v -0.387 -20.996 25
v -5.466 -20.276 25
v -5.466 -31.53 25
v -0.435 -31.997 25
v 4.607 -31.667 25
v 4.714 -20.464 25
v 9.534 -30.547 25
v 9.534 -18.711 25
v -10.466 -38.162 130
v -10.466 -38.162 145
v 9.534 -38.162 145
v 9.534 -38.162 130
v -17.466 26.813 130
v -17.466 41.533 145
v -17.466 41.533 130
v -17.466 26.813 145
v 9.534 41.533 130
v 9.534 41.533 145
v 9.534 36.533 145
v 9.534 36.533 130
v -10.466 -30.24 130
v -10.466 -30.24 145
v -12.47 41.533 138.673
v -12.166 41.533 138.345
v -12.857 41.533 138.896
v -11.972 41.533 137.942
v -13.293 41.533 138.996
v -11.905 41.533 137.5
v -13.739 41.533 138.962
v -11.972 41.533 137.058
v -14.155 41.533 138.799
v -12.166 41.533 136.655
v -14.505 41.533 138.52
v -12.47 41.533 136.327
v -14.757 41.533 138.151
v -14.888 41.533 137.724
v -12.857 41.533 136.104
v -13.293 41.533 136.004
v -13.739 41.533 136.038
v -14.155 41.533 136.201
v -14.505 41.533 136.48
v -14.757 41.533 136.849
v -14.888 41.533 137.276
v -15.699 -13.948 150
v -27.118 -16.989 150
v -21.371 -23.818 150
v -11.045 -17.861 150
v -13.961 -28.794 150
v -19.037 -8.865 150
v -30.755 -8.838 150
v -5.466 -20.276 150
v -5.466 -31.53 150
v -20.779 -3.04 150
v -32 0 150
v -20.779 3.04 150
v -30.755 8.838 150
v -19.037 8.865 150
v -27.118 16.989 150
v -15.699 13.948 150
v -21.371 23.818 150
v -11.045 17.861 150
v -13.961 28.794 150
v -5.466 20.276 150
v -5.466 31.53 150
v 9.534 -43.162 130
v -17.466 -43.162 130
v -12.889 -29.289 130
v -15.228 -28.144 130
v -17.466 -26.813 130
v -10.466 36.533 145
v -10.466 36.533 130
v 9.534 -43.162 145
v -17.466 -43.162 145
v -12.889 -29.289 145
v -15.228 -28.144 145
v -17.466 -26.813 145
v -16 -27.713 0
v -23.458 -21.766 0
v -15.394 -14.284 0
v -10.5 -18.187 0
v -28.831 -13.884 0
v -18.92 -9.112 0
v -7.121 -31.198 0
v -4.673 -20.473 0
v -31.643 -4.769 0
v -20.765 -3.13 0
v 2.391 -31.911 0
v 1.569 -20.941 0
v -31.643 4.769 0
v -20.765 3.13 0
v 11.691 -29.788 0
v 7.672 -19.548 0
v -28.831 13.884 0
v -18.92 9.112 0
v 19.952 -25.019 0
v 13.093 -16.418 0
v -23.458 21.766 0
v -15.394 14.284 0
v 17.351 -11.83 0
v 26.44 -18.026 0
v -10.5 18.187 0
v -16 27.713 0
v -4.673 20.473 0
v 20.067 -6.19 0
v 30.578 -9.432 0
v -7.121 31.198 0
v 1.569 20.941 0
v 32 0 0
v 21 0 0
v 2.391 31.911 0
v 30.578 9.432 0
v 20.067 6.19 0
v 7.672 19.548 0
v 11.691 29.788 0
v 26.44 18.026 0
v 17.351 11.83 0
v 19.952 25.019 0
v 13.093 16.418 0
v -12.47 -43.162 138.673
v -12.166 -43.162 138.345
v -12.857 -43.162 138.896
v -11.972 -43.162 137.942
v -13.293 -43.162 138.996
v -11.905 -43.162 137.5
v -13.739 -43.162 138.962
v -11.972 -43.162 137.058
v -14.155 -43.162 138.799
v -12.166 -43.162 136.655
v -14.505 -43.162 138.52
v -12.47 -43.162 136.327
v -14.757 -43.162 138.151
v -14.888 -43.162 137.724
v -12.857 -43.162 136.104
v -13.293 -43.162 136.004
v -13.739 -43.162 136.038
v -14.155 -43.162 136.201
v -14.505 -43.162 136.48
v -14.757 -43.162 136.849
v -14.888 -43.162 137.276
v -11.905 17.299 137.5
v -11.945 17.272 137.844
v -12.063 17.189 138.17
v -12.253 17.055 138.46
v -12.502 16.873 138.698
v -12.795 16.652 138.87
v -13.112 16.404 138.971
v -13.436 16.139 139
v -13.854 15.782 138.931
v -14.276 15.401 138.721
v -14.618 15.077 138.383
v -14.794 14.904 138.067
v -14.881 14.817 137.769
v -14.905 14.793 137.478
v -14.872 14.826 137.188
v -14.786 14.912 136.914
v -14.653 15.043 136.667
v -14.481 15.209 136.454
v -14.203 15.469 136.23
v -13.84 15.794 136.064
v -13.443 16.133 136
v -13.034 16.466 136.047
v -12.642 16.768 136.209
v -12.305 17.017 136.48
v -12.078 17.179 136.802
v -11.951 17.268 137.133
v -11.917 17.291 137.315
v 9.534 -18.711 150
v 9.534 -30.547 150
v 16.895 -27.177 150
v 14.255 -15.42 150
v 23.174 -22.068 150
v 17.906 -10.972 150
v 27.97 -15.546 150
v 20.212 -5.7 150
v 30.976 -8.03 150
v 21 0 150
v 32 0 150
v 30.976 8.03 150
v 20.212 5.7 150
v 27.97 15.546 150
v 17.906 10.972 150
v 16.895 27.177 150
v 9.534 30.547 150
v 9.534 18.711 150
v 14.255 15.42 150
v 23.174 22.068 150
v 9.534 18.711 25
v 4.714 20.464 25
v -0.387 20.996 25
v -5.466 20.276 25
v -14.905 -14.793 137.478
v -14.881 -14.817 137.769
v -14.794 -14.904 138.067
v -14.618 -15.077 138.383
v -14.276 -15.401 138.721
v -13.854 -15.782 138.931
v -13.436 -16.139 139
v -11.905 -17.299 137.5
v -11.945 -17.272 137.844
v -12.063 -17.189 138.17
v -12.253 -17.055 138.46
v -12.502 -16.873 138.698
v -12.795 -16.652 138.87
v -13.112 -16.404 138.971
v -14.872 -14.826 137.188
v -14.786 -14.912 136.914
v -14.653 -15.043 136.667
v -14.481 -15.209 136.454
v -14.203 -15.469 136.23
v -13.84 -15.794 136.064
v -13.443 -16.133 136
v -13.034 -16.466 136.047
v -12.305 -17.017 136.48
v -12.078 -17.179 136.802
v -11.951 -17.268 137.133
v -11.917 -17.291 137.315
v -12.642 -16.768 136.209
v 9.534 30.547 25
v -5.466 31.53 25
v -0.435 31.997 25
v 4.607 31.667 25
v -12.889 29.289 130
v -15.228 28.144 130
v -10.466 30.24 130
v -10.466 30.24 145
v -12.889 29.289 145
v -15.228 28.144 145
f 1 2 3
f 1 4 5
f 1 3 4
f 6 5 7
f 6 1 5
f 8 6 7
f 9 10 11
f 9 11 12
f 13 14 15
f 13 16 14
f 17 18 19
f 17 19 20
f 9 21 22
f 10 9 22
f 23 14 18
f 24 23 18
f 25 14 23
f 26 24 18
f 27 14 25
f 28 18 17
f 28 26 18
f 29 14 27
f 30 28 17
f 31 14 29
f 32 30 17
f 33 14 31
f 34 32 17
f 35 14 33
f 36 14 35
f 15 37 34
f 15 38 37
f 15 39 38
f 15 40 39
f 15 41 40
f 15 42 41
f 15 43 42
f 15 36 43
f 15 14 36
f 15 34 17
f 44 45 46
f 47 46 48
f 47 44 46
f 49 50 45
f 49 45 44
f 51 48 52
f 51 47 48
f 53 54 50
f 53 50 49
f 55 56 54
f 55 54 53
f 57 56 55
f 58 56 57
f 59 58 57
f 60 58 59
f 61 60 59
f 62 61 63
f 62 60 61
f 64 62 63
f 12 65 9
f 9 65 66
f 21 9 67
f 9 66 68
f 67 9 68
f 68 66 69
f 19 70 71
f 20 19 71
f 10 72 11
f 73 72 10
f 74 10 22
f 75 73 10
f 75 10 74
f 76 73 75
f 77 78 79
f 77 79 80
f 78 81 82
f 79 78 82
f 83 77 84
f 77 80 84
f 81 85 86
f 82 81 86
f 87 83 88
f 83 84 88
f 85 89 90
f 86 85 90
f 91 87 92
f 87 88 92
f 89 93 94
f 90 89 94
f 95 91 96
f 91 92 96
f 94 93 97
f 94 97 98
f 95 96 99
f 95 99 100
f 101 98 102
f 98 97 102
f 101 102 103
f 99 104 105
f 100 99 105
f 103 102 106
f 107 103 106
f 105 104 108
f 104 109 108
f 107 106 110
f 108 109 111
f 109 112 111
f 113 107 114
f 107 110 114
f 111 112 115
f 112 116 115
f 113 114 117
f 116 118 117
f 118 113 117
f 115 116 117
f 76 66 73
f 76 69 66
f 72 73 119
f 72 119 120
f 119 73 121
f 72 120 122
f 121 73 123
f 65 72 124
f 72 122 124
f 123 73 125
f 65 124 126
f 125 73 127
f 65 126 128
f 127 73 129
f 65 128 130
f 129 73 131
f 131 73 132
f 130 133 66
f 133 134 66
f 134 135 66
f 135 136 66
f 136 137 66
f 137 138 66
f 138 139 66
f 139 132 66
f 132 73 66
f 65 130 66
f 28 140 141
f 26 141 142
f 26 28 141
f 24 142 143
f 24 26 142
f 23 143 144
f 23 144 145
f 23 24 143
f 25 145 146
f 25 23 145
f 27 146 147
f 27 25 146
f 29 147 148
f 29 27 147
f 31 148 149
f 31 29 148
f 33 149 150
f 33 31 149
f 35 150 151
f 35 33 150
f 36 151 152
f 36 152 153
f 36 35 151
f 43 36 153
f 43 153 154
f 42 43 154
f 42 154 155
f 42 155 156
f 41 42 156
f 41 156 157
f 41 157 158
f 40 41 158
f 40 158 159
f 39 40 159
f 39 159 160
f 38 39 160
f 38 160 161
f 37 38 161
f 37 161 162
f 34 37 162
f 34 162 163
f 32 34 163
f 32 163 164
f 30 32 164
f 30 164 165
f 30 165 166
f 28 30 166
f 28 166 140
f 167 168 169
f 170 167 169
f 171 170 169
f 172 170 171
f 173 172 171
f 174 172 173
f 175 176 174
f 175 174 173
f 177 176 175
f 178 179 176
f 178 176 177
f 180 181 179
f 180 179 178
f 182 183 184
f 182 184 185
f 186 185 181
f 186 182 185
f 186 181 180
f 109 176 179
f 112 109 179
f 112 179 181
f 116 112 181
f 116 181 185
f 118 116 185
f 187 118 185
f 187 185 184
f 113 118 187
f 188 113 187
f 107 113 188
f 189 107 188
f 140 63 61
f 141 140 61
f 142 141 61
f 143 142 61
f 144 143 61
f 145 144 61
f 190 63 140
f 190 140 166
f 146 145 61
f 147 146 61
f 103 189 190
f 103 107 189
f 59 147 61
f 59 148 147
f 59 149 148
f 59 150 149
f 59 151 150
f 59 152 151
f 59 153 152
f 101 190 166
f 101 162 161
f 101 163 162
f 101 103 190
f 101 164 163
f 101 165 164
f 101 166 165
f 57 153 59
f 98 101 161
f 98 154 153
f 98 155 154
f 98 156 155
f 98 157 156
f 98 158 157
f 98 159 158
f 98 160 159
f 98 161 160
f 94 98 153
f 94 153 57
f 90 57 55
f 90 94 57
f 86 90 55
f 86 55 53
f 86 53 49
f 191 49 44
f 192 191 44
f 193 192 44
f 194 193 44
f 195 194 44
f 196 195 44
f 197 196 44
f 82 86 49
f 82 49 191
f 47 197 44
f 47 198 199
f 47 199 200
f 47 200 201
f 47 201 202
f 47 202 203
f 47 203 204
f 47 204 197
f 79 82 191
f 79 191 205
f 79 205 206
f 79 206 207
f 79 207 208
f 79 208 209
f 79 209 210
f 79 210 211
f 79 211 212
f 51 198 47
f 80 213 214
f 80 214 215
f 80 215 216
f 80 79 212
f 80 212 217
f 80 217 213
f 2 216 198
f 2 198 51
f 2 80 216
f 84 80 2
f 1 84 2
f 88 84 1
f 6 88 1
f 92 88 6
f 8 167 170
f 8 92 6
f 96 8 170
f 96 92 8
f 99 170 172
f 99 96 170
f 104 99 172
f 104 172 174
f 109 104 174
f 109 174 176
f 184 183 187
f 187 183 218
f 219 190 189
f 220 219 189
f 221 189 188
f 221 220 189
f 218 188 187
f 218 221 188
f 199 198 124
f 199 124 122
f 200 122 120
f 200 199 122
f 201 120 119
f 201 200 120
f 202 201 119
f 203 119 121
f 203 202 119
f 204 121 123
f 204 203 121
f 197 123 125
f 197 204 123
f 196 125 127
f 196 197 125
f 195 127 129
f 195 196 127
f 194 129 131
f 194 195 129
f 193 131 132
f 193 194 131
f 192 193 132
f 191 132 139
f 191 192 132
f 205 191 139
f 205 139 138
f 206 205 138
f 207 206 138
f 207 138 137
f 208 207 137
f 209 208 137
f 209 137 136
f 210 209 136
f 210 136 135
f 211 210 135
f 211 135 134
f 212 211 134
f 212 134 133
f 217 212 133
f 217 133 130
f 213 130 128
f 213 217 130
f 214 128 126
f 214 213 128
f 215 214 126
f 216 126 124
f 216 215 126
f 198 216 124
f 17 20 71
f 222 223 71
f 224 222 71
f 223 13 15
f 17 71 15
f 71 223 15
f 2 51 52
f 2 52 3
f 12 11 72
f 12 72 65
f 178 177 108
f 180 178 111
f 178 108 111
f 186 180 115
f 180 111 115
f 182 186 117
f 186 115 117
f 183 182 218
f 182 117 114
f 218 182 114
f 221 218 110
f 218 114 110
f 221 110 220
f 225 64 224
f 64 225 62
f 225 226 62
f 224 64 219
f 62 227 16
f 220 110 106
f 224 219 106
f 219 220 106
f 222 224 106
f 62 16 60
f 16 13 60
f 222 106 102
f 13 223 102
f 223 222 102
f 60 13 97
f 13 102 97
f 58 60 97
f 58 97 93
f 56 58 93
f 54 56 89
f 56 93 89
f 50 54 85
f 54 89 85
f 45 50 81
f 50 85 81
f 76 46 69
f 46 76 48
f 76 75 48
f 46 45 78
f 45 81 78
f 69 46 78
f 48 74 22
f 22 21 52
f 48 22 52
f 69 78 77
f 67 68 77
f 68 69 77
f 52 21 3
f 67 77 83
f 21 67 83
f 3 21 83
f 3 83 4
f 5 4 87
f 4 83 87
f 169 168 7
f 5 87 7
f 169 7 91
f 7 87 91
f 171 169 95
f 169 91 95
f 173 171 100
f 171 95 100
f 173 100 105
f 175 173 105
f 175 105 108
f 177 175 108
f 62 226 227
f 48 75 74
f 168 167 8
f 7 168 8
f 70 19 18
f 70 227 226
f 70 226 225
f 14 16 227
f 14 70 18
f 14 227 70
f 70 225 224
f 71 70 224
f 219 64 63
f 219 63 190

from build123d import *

# Parameters (mm, degrees)
ESBO_O1_R                     = 32
ESBO_O1_R_2                   = 21
RESSALTO_EXTRUS_O1_DEPTH      = 150
CORTE_EXTRUS_O1_DEPTH         = 167.643659607
CORTE_EXTRUS_O1_DEPTH_BACK    = 167.643659607
ESBO_O3_W                     = 125
ESBO_O3_H                     = 15
RESSALTO_EXTRUS_O2_REACH      = 168.644
RESSALTO_EXTRUS_O2_END_RADIUS = 32
ESBO_O4_W                     = 15
ESBO_O4_H                     = 7
ESBO_O5_W                     = 7
ESBO_O5_H                     = 15
RESSALTO_EXTRUS_O3_DEPTH      = 10
ESBO_O6_W                     = 15
ESBO_O6_H                     = 5
RESSALTO_EXTRUS_O4_DEPTH      = 20
RESSALTO_EXTRUS_O5_REACH      = 172.597
RESSALTO_EXTRUS_O5_END_RADIUS = 32
ESBO_O7_W                     = 15
ESBO_O7_H                     = 7
ESBO_O8_W                     = 7
ESBO_O8_H                     = 15
RESSALTO_EXTRUS_O6_DEPTH      = 10
ESBO_O9_W                     = 15
ESBO_O9_H                     = 5
RESSALTO_EXTRUS_O7_DEPTH      = 20
CORTE_EXTRUS_O2_DEPTH         = 176.206236165
CORTE_EXTRUS_O2_DEPTH_BACK    = 176.206236165
ESBO_O10_R                    = 1.5


with BuildPart() as part:
    # Esboço1 → Ressalto-extrusão1 (new body)
    with BuildSketch(Plane.XY):
        Circle(ESBO_O1_R)
        Circle(ESBO_O1_R_2, mode=Mode.SUBTRACT)
    extrude(amount=RESSALTO_EXTRUS_O1_DEPTH)

    # Esboço3 → Corte-extrusão1 (cut, two sides: drawn at the far end of the back side and taken through both)
    with BuildSketch(Plane(origin=(0, -33.162176816, 0), x_dir=(0, 0, -1), z_dir=(0, -1, 0)).offset(-CORTE_EXTRUS_O1_DEPTH_BACK)):
        with Locations((-87.5, 2.034407051)):
            Rectangle(ESBO_O3_W, ESBO_O3_H)
    extrude(amount=CORTE_EXTRUS_O1_DEPTH + CORTE_EXTRUS_O1_DEPTH_BACK, mode=Mode.SUBTRACT)

    # Ressalto-extrusão2: up to this cylinder (the profile starts outside it)
    ressalto_extrus_o2_end = Plane(origin=(0, 0, 137.5), z_dir=(0, 0, -1)) * Cylinder(RESSALTO_EXTRUS_O2_END_RADIUS, 402.288, mode=Mode.PRIVATE)
    # Esboço4 → Ressalto-extrusão2 (add, up to the surface)
    with BuildSketch(Plane(origin=(0, -33.162176816, 0), x_dir=(0, 0, -1), z_dir=(0, -1, 0)), mode=Mode.PRIVATE) as ressalto_extrus_o2_sk1:
        with Locations((-137.5, -13.965592949)):
            Rectangle(ESBO_O4_W, ESBO_O4_H)
    ressalto_extrus_o2_tool1 = extrude(ressalto_extrus_o2_sk1.sketch, amount=-RESSALTO_EXTRUS_O2_REACH, mode=Mode.PRIVATE) - ressalto_extrus_o2_end
    add(ressalto_extrus_o2_tool1.solids().sort_by_distance((-13.965593, -33.162177, 137.5))[0])

    # Esboço5 → Ressalto-extrusão3 (add)
    with BuildSketch(Plane.XZ.offset(33.162176816)):
        with Locations((-13.965592949, 137.5)):
            Rectangle(ESBO_O5_W, ESBO_O5_H)
    extrude(amount=RESSALTO_EXTRUS_O3_DEPTH)

    # Esboço6 → Ressalto-extrusão4 (add)
    with BuildSketch(Plane(origin=(-10.465592949, 0, 0), x_dir=(0, 0, -1), z_dir=(1, 0, 0))):
        with Locations((-137.5, -40.662176816)):
            Rectangle(ESBO_O6_W, ESBO_O6_H)
    extrude(amount=RESSALTO_EXTRUS_O4_DEPTH)

    # Ressalto-extrusão5: up to this cylinder (the profile starts outside it)
    ressalto_extrus_o5_end = Plane(origin=(0, 0, 137.5), z_dir=(0, 0, -1)) * Cylinder(RESSALTO_EXTRUS_O5_END_RADIUS, 410.194, mode=Mode.PRIVATE)
    # Esboço7 → Ressalto-extrusão5 (add, up to the surface)
    with BuildSketch(Plane.ZX.offset(31.532717901), mode=Mode.PRIVATE) as ressalto_extrus_o5_sk1:
        with Locations((137.5, -13.965592949)):
            Rectangle(ESBO_O7_W, ESBO_O7_H)
    ressalto_extrus_o5_tool1 = extrude(ressalto_extrus_o5_sk1.sketch, amount=-RESSALTO_EXTRUS_O5_REACH, mode=Mode.PRIVATE) - ressalto_extrus_o5_end
    add(ressalto_extrus_o5_tool1.solids().sort_by_distance((-13.965593, 31.532718, 137.5))[0])

    # Esboço8 → Ressalto-extrusão6 (add)
    with BuildSketch(Plane(origin=(0, 31.532717901, 0), x_dir=(1, 0, 0), z_dir=(0, 1, 0))):
        with Locations((-13.965592949, -137.5)):
            Rectangle(ESBO_O8_W, ESBO_O8_H)
    extrude(amount=RESSALTO_EXTRUS_O6_DEPTH)

    # Esboço9 → Ressalto-extrusão7 (add)
    with BuildSketch(Plane(origin=(-10.465592949, 0, 0), x_dir=(0, 0, -1), z_dir=(1, 0, 0))):
        with Locations((-137.5, 39.032717901)):
            Rectangle(ESBO_O9_W, ESBO_O9_H)
    extrude(amount=RESSALTO_EXTRUS_O7_DEPTH)

    # Esboço10 → Corte-extrusão2 (cut, two sides: drawn at the far end of the back side and taken through both)
    with BuildSketch(Plane.XZ.offset(43.162176816).offset(-CORTE_EXTRUS_O2_DEPTH_BACK)):
        with Locations((-13.4052452, 137.5)):
            Circle(ESBO_O10_R)
    extrude(amount=CORTE_EXTRUS_O2_DEPTH + CORTE_EXTRUS_O2_DEPTH_BACK, mode=Mode.SUBTRACT)


solid = part.part
